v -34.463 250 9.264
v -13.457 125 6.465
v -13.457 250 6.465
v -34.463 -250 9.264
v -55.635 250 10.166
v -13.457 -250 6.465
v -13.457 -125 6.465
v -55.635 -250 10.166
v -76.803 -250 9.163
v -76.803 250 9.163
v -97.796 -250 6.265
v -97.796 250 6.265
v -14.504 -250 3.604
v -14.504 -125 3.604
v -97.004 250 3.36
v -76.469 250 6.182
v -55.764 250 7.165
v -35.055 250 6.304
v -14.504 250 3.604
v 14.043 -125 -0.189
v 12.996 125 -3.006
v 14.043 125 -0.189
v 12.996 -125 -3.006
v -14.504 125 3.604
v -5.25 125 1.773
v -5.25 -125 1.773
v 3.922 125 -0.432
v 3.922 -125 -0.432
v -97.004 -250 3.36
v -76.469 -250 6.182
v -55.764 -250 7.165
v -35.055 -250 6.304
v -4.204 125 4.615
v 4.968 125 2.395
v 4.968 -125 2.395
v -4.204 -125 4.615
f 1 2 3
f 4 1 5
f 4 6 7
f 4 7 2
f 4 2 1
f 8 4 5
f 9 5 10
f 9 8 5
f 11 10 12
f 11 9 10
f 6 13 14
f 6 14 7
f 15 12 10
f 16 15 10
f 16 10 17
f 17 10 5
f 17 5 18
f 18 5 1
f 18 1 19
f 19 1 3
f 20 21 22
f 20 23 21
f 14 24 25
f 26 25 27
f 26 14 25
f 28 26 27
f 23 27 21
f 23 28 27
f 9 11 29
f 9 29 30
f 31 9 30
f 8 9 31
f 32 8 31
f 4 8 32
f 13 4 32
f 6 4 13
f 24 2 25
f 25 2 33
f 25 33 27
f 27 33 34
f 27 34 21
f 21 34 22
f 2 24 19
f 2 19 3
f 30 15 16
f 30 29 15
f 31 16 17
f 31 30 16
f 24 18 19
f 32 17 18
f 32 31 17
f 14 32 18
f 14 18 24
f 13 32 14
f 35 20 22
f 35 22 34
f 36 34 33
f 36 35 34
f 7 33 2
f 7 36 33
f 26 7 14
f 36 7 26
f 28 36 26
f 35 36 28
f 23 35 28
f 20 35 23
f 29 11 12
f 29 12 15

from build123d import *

# Parameters (mm, degrees)
F1_DEPTH = 250
F2_DEPTH = 125


with BuildPart() as f1:
    # F0 (on Front) → F1 (new body, symmetric)
    with BuildSketch(Plane.XZ):
        with BuildLine():
            Line((-14.503544, 3.604437), (-13.457058, 6.465255))
            ThreePointArc((-13.457058, 6.465255), (-55.63549, 10.165767), (-97.795863, 6.264893))
            Line((-97.795863, 6.264893), (-97.003544, 3.360226))
            ThreePointArc((-97.003544, 3.360226), (-55.764447, 7.165413), (-14.503544, 3.604437))
        make_face()
    extrude(amount=F1_DEPTH, both=True)

    # F0 (on Front) → F2 (join, symmetric)
    with BuildSketch(Plane.XZ):
        with BuildLine():
            Line((12.996456, -3.006309), (14.042942, -0.189243))
            ThreePointArc((14.042942, -0.189243), (0.392824, 3.550775), (-13.457058, 6.465255))
            Line((-13.457058, 6.465255), (-14.503544, 3.604437))
            ThreePointArc((-14.503544, 3.604437), (-0.653074, 0.717009), (12.996456, -3.006309))
        make_face()
    extrude(amount=F2_DEPTH, both=True)


solid = f1.part
